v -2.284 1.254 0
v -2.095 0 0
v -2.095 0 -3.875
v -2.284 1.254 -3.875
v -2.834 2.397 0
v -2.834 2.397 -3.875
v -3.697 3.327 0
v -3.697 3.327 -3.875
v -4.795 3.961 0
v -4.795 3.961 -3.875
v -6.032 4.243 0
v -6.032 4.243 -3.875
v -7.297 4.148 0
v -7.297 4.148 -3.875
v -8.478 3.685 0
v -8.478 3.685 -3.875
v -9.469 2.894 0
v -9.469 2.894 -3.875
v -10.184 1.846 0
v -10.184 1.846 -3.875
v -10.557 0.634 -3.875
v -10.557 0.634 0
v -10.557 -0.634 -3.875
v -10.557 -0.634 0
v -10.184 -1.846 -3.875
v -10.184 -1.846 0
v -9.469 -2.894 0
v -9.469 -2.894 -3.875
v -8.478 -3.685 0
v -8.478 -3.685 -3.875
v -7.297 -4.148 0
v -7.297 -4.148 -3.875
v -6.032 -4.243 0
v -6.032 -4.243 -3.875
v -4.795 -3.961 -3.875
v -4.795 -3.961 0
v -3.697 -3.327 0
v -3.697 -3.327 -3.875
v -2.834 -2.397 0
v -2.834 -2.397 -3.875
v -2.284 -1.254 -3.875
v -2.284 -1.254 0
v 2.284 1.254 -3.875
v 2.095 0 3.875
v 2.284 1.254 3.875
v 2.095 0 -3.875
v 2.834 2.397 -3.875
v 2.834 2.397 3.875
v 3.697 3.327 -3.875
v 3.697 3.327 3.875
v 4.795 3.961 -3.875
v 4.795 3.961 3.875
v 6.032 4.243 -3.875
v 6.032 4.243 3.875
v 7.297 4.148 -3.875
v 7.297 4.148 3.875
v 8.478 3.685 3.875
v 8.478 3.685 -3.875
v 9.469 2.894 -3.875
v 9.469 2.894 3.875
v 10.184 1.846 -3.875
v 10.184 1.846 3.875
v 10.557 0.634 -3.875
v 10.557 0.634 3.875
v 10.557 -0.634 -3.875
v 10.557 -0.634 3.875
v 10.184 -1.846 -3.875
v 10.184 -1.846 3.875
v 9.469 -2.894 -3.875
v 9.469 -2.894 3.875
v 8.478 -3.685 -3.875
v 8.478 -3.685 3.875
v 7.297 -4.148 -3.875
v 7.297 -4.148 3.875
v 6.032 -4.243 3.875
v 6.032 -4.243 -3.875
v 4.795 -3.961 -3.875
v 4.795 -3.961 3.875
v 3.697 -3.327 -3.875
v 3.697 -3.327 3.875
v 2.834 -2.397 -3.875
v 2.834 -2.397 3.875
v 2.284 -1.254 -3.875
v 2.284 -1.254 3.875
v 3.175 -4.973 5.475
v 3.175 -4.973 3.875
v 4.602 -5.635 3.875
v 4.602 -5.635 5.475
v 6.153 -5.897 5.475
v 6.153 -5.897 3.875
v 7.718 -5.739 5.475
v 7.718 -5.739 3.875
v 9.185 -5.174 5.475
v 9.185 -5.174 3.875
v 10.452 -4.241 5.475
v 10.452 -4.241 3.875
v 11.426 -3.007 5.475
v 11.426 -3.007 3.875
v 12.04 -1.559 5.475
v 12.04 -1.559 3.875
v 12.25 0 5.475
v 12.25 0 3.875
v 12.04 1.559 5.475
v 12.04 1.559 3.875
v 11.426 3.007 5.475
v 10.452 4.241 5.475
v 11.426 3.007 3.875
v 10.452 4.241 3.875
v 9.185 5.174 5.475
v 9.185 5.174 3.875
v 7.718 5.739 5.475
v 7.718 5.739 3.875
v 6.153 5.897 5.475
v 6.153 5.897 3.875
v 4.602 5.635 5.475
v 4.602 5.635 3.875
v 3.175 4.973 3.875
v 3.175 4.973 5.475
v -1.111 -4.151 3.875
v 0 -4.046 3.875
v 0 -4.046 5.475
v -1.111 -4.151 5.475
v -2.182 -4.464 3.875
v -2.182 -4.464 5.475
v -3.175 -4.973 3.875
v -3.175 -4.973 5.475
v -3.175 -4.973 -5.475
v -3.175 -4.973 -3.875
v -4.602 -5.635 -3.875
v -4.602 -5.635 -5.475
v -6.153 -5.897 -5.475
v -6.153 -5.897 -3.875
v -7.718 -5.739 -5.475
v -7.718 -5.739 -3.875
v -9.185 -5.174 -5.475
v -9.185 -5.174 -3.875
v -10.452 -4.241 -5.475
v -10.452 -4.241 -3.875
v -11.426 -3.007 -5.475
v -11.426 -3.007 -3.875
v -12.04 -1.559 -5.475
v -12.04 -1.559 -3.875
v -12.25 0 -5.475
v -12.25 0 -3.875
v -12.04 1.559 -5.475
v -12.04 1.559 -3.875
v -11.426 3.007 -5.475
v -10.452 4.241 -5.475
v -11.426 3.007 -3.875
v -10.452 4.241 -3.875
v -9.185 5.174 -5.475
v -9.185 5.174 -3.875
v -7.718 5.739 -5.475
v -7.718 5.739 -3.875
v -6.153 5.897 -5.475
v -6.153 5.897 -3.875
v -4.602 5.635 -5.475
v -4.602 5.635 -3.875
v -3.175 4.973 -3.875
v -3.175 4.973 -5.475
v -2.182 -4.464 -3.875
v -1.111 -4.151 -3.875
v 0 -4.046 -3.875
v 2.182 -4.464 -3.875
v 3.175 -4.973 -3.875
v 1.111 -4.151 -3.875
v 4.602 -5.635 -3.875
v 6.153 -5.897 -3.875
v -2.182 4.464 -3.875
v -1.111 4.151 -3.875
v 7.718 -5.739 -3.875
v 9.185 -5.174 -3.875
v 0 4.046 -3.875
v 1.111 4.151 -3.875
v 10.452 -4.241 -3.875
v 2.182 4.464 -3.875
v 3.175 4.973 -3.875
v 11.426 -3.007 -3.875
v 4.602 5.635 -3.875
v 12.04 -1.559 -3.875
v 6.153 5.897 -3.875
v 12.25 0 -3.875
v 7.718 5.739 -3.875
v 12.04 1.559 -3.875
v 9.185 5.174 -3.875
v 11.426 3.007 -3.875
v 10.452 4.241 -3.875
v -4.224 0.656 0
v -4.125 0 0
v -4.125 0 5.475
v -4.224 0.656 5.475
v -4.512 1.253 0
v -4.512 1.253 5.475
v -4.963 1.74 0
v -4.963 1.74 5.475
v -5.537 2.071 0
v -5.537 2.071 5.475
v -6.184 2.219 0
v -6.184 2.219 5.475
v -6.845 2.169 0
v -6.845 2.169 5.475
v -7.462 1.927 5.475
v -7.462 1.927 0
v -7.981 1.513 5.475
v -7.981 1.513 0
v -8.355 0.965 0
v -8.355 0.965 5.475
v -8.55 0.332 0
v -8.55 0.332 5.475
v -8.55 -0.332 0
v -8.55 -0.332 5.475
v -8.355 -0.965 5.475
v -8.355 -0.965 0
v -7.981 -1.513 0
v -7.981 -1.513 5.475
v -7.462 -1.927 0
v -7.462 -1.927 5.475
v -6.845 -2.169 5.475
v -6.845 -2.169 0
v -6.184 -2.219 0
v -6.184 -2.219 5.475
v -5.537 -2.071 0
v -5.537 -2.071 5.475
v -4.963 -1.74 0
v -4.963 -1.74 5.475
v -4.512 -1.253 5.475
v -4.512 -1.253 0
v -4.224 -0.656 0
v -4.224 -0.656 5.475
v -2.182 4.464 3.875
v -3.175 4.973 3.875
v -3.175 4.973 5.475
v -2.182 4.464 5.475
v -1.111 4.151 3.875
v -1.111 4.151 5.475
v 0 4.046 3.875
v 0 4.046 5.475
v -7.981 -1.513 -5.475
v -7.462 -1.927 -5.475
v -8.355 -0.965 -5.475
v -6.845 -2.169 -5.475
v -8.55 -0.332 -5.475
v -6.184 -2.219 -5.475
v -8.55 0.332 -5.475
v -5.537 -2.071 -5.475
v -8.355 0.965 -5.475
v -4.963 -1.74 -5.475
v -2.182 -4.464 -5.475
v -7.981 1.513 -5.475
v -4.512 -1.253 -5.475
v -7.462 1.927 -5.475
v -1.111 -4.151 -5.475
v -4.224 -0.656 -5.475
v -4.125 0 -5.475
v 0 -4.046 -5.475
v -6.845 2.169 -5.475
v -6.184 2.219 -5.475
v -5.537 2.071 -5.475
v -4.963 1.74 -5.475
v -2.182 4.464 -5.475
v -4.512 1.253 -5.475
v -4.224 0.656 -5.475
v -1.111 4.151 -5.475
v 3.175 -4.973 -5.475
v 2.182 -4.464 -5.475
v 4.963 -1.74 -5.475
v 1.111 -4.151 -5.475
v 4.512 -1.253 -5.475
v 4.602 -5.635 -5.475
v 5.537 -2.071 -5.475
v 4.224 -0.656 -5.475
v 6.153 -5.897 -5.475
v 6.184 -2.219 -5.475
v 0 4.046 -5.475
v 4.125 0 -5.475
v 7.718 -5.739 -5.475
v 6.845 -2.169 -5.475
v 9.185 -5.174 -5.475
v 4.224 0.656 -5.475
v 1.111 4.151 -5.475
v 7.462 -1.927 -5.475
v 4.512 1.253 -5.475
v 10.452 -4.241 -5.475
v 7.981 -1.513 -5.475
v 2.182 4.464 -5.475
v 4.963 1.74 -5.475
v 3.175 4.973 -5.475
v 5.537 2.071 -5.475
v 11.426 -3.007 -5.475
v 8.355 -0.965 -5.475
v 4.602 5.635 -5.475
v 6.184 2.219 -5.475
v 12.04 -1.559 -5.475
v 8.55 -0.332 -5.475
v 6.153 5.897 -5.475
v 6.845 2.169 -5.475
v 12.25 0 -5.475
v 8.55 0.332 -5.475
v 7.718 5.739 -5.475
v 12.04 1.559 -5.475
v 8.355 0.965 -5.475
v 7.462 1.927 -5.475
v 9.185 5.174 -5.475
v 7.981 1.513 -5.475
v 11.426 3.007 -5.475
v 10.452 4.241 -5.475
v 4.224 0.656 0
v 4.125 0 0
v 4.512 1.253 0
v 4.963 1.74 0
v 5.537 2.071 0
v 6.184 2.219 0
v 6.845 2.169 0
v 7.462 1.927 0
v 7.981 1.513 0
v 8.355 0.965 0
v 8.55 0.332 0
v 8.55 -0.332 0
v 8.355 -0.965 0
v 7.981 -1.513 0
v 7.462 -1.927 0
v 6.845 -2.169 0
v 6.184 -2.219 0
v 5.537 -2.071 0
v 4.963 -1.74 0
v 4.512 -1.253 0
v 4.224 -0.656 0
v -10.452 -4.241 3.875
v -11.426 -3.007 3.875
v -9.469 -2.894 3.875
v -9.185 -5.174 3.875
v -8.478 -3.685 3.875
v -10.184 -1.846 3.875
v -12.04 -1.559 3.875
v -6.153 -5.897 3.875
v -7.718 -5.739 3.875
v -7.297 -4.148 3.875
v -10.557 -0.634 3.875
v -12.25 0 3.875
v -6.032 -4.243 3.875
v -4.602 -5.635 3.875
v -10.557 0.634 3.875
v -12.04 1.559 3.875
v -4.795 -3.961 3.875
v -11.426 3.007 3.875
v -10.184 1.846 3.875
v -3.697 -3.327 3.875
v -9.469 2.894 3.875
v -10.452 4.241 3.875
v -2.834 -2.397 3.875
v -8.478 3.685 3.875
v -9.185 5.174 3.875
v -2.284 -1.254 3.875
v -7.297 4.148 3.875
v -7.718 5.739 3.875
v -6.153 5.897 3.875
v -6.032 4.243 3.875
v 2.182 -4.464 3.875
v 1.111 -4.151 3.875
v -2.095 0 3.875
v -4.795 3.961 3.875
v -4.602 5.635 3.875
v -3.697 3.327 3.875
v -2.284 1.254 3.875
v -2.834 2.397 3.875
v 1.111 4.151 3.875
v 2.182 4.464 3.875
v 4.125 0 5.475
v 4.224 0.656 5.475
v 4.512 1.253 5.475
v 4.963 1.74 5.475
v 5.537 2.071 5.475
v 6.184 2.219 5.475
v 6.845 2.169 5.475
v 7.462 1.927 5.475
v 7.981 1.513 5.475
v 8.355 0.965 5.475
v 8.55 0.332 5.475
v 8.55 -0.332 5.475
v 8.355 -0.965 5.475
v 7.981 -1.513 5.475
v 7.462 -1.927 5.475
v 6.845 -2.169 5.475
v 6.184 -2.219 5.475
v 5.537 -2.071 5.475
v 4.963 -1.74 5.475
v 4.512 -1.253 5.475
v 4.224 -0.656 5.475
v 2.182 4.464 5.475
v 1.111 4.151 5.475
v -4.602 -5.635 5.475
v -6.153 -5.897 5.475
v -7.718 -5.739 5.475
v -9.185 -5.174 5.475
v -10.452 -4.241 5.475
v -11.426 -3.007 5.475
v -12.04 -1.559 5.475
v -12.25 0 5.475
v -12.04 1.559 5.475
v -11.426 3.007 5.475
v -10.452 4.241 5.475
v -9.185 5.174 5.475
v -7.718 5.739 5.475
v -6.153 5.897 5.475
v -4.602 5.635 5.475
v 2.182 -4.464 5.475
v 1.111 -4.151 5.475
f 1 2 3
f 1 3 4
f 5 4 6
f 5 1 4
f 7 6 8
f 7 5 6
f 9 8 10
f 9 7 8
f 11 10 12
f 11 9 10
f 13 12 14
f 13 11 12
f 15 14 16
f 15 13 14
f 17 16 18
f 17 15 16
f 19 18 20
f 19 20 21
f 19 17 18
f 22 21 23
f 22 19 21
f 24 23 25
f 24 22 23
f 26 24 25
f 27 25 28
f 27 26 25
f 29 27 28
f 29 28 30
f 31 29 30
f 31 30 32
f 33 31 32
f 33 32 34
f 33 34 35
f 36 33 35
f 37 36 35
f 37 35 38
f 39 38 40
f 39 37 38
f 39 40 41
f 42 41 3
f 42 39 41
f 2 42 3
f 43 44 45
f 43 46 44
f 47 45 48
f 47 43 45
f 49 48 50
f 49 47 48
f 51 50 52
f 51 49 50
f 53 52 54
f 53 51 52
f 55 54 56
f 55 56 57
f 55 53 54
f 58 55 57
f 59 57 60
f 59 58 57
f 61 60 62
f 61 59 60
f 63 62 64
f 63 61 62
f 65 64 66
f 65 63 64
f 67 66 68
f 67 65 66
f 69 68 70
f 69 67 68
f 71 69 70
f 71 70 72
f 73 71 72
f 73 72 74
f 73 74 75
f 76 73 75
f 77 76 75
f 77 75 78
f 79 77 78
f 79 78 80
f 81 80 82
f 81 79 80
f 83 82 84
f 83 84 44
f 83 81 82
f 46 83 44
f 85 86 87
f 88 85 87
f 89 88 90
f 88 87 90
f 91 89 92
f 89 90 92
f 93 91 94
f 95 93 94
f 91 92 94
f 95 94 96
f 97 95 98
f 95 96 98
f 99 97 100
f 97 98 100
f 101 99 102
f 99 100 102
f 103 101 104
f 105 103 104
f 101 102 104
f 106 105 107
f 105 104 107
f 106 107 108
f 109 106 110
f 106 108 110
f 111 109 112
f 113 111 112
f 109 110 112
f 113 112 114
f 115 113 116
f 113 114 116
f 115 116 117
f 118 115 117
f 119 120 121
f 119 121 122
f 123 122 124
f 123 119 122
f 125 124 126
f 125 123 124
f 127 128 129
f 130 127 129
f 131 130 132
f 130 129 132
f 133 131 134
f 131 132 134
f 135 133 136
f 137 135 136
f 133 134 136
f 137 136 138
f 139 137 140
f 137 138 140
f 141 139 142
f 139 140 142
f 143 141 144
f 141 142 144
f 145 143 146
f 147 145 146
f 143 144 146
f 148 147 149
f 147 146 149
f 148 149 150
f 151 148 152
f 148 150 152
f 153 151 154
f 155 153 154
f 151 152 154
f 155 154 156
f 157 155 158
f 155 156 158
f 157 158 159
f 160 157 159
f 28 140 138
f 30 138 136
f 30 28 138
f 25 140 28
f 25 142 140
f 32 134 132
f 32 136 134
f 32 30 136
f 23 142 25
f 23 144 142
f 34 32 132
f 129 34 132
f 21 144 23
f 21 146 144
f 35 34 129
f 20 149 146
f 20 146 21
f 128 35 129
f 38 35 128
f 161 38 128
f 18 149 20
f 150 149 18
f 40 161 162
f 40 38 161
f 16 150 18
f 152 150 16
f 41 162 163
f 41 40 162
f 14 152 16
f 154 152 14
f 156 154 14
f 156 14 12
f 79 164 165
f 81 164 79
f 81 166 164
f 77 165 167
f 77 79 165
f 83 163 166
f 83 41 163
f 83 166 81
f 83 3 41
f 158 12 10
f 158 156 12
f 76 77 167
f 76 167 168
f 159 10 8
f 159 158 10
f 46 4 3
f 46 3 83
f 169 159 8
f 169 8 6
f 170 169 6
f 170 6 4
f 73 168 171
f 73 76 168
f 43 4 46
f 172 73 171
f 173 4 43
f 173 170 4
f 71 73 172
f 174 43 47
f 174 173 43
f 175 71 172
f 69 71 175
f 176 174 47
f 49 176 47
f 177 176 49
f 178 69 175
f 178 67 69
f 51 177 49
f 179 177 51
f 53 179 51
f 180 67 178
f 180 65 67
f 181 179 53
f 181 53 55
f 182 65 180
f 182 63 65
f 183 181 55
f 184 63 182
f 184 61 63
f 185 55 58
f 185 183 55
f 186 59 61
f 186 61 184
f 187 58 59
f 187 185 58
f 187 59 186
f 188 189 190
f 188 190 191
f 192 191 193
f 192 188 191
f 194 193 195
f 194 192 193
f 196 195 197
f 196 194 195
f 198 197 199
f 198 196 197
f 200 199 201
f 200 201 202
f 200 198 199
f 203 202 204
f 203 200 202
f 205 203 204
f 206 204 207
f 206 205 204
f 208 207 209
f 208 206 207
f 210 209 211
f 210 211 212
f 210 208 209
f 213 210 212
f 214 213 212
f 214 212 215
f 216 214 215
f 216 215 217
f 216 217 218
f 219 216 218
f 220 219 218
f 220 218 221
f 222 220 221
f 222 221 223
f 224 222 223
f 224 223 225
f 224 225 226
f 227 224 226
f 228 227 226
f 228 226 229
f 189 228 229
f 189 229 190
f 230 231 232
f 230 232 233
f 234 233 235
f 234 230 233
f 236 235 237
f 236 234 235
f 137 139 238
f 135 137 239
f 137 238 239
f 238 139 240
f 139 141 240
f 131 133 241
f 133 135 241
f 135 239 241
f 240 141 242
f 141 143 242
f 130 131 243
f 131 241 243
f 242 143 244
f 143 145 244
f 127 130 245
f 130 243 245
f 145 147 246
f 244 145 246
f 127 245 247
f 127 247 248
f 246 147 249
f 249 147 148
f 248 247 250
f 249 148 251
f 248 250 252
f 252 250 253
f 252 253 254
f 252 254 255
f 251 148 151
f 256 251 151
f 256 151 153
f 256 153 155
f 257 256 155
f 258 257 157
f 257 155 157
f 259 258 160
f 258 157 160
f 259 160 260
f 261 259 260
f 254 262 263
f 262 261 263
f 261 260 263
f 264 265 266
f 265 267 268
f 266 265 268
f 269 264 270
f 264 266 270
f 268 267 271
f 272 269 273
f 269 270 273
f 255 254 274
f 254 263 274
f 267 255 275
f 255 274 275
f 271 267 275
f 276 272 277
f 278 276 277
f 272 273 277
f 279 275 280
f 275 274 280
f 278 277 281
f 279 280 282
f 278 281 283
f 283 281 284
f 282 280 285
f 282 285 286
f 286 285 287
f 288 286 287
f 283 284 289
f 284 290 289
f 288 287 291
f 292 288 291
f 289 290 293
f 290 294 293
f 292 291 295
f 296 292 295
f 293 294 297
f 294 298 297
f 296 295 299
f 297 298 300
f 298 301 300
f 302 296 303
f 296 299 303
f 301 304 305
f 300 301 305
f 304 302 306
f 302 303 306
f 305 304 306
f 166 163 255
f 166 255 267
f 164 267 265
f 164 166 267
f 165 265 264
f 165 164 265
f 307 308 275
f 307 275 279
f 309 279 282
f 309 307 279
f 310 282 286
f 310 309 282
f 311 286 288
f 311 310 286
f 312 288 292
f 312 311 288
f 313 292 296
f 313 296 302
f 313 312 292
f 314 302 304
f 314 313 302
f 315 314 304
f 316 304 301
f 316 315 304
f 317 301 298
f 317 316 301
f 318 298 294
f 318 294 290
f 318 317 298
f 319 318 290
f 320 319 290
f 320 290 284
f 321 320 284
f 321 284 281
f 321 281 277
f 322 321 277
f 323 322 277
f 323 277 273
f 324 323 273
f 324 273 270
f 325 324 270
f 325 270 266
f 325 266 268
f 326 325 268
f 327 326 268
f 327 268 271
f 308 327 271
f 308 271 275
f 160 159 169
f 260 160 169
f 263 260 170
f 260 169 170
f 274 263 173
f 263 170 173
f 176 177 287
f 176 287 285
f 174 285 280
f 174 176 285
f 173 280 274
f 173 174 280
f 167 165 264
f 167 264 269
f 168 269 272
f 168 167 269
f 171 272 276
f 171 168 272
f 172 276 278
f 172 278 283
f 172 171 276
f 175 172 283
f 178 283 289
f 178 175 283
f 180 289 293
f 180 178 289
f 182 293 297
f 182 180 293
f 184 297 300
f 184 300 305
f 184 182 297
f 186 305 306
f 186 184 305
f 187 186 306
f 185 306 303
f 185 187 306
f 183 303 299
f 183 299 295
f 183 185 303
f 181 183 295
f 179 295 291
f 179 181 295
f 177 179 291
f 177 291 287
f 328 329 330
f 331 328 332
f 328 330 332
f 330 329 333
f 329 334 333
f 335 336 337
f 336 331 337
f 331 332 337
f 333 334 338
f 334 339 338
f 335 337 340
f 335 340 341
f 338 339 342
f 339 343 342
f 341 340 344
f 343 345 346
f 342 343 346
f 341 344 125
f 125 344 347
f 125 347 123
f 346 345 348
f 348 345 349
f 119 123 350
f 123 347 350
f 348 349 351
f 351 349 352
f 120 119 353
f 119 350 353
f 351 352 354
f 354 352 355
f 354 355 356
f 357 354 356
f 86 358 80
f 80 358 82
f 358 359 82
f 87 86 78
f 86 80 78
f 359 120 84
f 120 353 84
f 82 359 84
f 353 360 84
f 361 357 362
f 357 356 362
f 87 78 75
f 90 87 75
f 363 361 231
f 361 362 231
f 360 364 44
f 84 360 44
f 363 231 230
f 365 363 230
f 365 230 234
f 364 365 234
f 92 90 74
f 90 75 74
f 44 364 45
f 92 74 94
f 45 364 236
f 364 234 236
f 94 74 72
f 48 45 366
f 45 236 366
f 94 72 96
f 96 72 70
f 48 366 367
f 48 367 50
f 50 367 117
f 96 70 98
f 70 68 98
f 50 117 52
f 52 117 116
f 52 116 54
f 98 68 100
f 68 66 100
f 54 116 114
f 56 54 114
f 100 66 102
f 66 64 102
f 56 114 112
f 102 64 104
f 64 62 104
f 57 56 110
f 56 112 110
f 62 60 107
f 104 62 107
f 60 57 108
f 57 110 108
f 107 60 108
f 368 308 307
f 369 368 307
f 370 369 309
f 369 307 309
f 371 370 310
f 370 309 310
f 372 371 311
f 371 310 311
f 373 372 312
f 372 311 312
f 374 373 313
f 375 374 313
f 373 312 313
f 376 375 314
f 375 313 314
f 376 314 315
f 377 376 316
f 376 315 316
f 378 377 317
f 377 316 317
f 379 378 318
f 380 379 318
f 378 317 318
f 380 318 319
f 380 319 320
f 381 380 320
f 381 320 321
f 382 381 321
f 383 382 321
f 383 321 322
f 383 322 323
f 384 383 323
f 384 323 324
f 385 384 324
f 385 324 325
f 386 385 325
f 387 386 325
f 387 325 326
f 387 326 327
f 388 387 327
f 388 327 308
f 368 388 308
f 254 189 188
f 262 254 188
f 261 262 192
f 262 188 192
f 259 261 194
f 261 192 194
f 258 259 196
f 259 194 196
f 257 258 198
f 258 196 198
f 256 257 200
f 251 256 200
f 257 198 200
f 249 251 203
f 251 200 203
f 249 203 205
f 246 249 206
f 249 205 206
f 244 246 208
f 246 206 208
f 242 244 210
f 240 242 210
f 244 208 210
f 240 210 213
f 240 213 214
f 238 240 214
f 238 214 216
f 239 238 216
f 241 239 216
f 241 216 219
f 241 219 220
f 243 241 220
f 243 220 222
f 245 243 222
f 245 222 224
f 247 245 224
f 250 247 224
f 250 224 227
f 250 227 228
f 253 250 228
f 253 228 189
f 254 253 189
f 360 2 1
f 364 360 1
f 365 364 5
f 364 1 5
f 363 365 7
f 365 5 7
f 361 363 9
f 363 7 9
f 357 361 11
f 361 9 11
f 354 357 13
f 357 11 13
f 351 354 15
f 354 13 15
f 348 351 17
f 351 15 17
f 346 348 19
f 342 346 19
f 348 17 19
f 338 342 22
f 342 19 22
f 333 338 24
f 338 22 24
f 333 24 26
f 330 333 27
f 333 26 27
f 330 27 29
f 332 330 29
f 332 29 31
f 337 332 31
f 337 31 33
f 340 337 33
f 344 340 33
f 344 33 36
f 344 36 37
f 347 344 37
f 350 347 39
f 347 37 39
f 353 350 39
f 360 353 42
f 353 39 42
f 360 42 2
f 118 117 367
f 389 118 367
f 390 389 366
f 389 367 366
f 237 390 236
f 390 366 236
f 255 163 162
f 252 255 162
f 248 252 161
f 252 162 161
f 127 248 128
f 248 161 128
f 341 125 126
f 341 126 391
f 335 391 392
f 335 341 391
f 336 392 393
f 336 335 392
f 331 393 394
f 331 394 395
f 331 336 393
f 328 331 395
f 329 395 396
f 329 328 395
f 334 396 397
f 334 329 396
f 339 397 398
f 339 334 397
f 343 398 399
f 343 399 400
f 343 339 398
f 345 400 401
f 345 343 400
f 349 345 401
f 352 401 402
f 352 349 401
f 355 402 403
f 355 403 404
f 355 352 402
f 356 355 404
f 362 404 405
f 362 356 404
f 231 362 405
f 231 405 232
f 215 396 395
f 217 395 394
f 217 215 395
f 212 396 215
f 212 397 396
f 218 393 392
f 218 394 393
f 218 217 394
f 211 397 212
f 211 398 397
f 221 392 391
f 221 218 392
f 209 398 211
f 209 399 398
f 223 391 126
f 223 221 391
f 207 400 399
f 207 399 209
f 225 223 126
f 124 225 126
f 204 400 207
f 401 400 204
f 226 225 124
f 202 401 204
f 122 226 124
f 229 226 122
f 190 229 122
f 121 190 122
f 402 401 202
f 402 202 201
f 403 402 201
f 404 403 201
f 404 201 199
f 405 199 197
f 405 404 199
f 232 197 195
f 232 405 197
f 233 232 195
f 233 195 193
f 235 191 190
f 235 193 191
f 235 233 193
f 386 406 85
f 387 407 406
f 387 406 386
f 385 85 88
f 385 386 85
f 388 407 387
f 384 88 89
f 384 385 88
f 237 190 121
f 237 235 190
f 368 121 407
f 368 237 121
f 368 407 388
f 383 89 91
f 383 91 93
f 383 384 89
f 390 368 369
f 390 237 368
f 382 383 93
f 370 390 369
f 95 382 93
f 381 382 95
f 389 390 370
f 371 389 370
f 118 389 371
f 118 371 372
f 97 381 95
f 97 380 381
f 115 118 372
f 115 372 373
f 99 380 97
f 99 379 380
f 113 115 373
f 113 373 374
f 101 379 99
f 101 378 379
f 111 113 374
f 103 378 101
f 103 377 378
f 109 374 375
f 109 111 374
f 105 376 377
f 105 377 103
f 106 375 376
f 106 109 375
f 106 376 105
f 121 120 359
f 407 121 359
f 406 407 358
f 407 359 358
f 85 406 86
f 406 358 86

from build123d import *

# Parameters (mm, degrees)
EXTRUDE_START   = -3.875
SKETCH_1_R      = 2.225
EXTRUDE_1_DEPTH = 1.6
SKETCH_1_3_R    = 4.255
SKETCH_1_3_R_2  = 2.225
EXTRUDE_2_DEPTH = 3.875


with BuildPart() as part:
    # Эскиз1 → Бобышка-Вытянуть1 (new body)
    with BuildSketch(Plane.XY.offset(EXTRUDE_START)):
        with BuildLine():
            Line((0, 4.045727726), (0, -4.045727726))
            ThreePointArc((0, -4.045727726), (-1.653799143, -4.282252786), (-3.175, -4.972863863))
            ThreePointArc((-3.175, -4.972863863), (-12.25, 0), (-3.175, 4.972863863))
            ThreePointArc((-3.175, 4.972863863), (-1.653799143, 4.282252786), (0, 4.045727726))
        make_face()
        with Locations((-6.35, 0)):
            Circle(SKETCH_1_R, mode=Mode.SUBTRACT)
    extrude(amount=-EXTRUDE_1_DEPTH)

    # Эскиз1<3> → Бобышка-Вытянуть2 (add)
    with BuildSketch(Plane.XY):
        with Locations((-6.35, 0)):
            Circle(SKETCH_1_3_R)
        with Locations((-6.35, 0)):
            Circle(SKETCH_1_3_R_2, mode=Mode.SUBTRACT)
    extrude(amount=-EXTRUDE_2_DEPTH)

    # Зеркальное отражение1: part across plane


with BuildPart() as part_1:
    add(part.part)
    add(part.part.mirror(Plane(origin=(0, 0, 0), x_dir=(0, 0, 1), z_dir=(1, 0, 0))))

    # Зеркальное отражение2: part across plane


with BuildPart() as part_2:
    add(part_1.part)
    add(part_1.part.mirror(Plane.XY))


solid = part_2.part
